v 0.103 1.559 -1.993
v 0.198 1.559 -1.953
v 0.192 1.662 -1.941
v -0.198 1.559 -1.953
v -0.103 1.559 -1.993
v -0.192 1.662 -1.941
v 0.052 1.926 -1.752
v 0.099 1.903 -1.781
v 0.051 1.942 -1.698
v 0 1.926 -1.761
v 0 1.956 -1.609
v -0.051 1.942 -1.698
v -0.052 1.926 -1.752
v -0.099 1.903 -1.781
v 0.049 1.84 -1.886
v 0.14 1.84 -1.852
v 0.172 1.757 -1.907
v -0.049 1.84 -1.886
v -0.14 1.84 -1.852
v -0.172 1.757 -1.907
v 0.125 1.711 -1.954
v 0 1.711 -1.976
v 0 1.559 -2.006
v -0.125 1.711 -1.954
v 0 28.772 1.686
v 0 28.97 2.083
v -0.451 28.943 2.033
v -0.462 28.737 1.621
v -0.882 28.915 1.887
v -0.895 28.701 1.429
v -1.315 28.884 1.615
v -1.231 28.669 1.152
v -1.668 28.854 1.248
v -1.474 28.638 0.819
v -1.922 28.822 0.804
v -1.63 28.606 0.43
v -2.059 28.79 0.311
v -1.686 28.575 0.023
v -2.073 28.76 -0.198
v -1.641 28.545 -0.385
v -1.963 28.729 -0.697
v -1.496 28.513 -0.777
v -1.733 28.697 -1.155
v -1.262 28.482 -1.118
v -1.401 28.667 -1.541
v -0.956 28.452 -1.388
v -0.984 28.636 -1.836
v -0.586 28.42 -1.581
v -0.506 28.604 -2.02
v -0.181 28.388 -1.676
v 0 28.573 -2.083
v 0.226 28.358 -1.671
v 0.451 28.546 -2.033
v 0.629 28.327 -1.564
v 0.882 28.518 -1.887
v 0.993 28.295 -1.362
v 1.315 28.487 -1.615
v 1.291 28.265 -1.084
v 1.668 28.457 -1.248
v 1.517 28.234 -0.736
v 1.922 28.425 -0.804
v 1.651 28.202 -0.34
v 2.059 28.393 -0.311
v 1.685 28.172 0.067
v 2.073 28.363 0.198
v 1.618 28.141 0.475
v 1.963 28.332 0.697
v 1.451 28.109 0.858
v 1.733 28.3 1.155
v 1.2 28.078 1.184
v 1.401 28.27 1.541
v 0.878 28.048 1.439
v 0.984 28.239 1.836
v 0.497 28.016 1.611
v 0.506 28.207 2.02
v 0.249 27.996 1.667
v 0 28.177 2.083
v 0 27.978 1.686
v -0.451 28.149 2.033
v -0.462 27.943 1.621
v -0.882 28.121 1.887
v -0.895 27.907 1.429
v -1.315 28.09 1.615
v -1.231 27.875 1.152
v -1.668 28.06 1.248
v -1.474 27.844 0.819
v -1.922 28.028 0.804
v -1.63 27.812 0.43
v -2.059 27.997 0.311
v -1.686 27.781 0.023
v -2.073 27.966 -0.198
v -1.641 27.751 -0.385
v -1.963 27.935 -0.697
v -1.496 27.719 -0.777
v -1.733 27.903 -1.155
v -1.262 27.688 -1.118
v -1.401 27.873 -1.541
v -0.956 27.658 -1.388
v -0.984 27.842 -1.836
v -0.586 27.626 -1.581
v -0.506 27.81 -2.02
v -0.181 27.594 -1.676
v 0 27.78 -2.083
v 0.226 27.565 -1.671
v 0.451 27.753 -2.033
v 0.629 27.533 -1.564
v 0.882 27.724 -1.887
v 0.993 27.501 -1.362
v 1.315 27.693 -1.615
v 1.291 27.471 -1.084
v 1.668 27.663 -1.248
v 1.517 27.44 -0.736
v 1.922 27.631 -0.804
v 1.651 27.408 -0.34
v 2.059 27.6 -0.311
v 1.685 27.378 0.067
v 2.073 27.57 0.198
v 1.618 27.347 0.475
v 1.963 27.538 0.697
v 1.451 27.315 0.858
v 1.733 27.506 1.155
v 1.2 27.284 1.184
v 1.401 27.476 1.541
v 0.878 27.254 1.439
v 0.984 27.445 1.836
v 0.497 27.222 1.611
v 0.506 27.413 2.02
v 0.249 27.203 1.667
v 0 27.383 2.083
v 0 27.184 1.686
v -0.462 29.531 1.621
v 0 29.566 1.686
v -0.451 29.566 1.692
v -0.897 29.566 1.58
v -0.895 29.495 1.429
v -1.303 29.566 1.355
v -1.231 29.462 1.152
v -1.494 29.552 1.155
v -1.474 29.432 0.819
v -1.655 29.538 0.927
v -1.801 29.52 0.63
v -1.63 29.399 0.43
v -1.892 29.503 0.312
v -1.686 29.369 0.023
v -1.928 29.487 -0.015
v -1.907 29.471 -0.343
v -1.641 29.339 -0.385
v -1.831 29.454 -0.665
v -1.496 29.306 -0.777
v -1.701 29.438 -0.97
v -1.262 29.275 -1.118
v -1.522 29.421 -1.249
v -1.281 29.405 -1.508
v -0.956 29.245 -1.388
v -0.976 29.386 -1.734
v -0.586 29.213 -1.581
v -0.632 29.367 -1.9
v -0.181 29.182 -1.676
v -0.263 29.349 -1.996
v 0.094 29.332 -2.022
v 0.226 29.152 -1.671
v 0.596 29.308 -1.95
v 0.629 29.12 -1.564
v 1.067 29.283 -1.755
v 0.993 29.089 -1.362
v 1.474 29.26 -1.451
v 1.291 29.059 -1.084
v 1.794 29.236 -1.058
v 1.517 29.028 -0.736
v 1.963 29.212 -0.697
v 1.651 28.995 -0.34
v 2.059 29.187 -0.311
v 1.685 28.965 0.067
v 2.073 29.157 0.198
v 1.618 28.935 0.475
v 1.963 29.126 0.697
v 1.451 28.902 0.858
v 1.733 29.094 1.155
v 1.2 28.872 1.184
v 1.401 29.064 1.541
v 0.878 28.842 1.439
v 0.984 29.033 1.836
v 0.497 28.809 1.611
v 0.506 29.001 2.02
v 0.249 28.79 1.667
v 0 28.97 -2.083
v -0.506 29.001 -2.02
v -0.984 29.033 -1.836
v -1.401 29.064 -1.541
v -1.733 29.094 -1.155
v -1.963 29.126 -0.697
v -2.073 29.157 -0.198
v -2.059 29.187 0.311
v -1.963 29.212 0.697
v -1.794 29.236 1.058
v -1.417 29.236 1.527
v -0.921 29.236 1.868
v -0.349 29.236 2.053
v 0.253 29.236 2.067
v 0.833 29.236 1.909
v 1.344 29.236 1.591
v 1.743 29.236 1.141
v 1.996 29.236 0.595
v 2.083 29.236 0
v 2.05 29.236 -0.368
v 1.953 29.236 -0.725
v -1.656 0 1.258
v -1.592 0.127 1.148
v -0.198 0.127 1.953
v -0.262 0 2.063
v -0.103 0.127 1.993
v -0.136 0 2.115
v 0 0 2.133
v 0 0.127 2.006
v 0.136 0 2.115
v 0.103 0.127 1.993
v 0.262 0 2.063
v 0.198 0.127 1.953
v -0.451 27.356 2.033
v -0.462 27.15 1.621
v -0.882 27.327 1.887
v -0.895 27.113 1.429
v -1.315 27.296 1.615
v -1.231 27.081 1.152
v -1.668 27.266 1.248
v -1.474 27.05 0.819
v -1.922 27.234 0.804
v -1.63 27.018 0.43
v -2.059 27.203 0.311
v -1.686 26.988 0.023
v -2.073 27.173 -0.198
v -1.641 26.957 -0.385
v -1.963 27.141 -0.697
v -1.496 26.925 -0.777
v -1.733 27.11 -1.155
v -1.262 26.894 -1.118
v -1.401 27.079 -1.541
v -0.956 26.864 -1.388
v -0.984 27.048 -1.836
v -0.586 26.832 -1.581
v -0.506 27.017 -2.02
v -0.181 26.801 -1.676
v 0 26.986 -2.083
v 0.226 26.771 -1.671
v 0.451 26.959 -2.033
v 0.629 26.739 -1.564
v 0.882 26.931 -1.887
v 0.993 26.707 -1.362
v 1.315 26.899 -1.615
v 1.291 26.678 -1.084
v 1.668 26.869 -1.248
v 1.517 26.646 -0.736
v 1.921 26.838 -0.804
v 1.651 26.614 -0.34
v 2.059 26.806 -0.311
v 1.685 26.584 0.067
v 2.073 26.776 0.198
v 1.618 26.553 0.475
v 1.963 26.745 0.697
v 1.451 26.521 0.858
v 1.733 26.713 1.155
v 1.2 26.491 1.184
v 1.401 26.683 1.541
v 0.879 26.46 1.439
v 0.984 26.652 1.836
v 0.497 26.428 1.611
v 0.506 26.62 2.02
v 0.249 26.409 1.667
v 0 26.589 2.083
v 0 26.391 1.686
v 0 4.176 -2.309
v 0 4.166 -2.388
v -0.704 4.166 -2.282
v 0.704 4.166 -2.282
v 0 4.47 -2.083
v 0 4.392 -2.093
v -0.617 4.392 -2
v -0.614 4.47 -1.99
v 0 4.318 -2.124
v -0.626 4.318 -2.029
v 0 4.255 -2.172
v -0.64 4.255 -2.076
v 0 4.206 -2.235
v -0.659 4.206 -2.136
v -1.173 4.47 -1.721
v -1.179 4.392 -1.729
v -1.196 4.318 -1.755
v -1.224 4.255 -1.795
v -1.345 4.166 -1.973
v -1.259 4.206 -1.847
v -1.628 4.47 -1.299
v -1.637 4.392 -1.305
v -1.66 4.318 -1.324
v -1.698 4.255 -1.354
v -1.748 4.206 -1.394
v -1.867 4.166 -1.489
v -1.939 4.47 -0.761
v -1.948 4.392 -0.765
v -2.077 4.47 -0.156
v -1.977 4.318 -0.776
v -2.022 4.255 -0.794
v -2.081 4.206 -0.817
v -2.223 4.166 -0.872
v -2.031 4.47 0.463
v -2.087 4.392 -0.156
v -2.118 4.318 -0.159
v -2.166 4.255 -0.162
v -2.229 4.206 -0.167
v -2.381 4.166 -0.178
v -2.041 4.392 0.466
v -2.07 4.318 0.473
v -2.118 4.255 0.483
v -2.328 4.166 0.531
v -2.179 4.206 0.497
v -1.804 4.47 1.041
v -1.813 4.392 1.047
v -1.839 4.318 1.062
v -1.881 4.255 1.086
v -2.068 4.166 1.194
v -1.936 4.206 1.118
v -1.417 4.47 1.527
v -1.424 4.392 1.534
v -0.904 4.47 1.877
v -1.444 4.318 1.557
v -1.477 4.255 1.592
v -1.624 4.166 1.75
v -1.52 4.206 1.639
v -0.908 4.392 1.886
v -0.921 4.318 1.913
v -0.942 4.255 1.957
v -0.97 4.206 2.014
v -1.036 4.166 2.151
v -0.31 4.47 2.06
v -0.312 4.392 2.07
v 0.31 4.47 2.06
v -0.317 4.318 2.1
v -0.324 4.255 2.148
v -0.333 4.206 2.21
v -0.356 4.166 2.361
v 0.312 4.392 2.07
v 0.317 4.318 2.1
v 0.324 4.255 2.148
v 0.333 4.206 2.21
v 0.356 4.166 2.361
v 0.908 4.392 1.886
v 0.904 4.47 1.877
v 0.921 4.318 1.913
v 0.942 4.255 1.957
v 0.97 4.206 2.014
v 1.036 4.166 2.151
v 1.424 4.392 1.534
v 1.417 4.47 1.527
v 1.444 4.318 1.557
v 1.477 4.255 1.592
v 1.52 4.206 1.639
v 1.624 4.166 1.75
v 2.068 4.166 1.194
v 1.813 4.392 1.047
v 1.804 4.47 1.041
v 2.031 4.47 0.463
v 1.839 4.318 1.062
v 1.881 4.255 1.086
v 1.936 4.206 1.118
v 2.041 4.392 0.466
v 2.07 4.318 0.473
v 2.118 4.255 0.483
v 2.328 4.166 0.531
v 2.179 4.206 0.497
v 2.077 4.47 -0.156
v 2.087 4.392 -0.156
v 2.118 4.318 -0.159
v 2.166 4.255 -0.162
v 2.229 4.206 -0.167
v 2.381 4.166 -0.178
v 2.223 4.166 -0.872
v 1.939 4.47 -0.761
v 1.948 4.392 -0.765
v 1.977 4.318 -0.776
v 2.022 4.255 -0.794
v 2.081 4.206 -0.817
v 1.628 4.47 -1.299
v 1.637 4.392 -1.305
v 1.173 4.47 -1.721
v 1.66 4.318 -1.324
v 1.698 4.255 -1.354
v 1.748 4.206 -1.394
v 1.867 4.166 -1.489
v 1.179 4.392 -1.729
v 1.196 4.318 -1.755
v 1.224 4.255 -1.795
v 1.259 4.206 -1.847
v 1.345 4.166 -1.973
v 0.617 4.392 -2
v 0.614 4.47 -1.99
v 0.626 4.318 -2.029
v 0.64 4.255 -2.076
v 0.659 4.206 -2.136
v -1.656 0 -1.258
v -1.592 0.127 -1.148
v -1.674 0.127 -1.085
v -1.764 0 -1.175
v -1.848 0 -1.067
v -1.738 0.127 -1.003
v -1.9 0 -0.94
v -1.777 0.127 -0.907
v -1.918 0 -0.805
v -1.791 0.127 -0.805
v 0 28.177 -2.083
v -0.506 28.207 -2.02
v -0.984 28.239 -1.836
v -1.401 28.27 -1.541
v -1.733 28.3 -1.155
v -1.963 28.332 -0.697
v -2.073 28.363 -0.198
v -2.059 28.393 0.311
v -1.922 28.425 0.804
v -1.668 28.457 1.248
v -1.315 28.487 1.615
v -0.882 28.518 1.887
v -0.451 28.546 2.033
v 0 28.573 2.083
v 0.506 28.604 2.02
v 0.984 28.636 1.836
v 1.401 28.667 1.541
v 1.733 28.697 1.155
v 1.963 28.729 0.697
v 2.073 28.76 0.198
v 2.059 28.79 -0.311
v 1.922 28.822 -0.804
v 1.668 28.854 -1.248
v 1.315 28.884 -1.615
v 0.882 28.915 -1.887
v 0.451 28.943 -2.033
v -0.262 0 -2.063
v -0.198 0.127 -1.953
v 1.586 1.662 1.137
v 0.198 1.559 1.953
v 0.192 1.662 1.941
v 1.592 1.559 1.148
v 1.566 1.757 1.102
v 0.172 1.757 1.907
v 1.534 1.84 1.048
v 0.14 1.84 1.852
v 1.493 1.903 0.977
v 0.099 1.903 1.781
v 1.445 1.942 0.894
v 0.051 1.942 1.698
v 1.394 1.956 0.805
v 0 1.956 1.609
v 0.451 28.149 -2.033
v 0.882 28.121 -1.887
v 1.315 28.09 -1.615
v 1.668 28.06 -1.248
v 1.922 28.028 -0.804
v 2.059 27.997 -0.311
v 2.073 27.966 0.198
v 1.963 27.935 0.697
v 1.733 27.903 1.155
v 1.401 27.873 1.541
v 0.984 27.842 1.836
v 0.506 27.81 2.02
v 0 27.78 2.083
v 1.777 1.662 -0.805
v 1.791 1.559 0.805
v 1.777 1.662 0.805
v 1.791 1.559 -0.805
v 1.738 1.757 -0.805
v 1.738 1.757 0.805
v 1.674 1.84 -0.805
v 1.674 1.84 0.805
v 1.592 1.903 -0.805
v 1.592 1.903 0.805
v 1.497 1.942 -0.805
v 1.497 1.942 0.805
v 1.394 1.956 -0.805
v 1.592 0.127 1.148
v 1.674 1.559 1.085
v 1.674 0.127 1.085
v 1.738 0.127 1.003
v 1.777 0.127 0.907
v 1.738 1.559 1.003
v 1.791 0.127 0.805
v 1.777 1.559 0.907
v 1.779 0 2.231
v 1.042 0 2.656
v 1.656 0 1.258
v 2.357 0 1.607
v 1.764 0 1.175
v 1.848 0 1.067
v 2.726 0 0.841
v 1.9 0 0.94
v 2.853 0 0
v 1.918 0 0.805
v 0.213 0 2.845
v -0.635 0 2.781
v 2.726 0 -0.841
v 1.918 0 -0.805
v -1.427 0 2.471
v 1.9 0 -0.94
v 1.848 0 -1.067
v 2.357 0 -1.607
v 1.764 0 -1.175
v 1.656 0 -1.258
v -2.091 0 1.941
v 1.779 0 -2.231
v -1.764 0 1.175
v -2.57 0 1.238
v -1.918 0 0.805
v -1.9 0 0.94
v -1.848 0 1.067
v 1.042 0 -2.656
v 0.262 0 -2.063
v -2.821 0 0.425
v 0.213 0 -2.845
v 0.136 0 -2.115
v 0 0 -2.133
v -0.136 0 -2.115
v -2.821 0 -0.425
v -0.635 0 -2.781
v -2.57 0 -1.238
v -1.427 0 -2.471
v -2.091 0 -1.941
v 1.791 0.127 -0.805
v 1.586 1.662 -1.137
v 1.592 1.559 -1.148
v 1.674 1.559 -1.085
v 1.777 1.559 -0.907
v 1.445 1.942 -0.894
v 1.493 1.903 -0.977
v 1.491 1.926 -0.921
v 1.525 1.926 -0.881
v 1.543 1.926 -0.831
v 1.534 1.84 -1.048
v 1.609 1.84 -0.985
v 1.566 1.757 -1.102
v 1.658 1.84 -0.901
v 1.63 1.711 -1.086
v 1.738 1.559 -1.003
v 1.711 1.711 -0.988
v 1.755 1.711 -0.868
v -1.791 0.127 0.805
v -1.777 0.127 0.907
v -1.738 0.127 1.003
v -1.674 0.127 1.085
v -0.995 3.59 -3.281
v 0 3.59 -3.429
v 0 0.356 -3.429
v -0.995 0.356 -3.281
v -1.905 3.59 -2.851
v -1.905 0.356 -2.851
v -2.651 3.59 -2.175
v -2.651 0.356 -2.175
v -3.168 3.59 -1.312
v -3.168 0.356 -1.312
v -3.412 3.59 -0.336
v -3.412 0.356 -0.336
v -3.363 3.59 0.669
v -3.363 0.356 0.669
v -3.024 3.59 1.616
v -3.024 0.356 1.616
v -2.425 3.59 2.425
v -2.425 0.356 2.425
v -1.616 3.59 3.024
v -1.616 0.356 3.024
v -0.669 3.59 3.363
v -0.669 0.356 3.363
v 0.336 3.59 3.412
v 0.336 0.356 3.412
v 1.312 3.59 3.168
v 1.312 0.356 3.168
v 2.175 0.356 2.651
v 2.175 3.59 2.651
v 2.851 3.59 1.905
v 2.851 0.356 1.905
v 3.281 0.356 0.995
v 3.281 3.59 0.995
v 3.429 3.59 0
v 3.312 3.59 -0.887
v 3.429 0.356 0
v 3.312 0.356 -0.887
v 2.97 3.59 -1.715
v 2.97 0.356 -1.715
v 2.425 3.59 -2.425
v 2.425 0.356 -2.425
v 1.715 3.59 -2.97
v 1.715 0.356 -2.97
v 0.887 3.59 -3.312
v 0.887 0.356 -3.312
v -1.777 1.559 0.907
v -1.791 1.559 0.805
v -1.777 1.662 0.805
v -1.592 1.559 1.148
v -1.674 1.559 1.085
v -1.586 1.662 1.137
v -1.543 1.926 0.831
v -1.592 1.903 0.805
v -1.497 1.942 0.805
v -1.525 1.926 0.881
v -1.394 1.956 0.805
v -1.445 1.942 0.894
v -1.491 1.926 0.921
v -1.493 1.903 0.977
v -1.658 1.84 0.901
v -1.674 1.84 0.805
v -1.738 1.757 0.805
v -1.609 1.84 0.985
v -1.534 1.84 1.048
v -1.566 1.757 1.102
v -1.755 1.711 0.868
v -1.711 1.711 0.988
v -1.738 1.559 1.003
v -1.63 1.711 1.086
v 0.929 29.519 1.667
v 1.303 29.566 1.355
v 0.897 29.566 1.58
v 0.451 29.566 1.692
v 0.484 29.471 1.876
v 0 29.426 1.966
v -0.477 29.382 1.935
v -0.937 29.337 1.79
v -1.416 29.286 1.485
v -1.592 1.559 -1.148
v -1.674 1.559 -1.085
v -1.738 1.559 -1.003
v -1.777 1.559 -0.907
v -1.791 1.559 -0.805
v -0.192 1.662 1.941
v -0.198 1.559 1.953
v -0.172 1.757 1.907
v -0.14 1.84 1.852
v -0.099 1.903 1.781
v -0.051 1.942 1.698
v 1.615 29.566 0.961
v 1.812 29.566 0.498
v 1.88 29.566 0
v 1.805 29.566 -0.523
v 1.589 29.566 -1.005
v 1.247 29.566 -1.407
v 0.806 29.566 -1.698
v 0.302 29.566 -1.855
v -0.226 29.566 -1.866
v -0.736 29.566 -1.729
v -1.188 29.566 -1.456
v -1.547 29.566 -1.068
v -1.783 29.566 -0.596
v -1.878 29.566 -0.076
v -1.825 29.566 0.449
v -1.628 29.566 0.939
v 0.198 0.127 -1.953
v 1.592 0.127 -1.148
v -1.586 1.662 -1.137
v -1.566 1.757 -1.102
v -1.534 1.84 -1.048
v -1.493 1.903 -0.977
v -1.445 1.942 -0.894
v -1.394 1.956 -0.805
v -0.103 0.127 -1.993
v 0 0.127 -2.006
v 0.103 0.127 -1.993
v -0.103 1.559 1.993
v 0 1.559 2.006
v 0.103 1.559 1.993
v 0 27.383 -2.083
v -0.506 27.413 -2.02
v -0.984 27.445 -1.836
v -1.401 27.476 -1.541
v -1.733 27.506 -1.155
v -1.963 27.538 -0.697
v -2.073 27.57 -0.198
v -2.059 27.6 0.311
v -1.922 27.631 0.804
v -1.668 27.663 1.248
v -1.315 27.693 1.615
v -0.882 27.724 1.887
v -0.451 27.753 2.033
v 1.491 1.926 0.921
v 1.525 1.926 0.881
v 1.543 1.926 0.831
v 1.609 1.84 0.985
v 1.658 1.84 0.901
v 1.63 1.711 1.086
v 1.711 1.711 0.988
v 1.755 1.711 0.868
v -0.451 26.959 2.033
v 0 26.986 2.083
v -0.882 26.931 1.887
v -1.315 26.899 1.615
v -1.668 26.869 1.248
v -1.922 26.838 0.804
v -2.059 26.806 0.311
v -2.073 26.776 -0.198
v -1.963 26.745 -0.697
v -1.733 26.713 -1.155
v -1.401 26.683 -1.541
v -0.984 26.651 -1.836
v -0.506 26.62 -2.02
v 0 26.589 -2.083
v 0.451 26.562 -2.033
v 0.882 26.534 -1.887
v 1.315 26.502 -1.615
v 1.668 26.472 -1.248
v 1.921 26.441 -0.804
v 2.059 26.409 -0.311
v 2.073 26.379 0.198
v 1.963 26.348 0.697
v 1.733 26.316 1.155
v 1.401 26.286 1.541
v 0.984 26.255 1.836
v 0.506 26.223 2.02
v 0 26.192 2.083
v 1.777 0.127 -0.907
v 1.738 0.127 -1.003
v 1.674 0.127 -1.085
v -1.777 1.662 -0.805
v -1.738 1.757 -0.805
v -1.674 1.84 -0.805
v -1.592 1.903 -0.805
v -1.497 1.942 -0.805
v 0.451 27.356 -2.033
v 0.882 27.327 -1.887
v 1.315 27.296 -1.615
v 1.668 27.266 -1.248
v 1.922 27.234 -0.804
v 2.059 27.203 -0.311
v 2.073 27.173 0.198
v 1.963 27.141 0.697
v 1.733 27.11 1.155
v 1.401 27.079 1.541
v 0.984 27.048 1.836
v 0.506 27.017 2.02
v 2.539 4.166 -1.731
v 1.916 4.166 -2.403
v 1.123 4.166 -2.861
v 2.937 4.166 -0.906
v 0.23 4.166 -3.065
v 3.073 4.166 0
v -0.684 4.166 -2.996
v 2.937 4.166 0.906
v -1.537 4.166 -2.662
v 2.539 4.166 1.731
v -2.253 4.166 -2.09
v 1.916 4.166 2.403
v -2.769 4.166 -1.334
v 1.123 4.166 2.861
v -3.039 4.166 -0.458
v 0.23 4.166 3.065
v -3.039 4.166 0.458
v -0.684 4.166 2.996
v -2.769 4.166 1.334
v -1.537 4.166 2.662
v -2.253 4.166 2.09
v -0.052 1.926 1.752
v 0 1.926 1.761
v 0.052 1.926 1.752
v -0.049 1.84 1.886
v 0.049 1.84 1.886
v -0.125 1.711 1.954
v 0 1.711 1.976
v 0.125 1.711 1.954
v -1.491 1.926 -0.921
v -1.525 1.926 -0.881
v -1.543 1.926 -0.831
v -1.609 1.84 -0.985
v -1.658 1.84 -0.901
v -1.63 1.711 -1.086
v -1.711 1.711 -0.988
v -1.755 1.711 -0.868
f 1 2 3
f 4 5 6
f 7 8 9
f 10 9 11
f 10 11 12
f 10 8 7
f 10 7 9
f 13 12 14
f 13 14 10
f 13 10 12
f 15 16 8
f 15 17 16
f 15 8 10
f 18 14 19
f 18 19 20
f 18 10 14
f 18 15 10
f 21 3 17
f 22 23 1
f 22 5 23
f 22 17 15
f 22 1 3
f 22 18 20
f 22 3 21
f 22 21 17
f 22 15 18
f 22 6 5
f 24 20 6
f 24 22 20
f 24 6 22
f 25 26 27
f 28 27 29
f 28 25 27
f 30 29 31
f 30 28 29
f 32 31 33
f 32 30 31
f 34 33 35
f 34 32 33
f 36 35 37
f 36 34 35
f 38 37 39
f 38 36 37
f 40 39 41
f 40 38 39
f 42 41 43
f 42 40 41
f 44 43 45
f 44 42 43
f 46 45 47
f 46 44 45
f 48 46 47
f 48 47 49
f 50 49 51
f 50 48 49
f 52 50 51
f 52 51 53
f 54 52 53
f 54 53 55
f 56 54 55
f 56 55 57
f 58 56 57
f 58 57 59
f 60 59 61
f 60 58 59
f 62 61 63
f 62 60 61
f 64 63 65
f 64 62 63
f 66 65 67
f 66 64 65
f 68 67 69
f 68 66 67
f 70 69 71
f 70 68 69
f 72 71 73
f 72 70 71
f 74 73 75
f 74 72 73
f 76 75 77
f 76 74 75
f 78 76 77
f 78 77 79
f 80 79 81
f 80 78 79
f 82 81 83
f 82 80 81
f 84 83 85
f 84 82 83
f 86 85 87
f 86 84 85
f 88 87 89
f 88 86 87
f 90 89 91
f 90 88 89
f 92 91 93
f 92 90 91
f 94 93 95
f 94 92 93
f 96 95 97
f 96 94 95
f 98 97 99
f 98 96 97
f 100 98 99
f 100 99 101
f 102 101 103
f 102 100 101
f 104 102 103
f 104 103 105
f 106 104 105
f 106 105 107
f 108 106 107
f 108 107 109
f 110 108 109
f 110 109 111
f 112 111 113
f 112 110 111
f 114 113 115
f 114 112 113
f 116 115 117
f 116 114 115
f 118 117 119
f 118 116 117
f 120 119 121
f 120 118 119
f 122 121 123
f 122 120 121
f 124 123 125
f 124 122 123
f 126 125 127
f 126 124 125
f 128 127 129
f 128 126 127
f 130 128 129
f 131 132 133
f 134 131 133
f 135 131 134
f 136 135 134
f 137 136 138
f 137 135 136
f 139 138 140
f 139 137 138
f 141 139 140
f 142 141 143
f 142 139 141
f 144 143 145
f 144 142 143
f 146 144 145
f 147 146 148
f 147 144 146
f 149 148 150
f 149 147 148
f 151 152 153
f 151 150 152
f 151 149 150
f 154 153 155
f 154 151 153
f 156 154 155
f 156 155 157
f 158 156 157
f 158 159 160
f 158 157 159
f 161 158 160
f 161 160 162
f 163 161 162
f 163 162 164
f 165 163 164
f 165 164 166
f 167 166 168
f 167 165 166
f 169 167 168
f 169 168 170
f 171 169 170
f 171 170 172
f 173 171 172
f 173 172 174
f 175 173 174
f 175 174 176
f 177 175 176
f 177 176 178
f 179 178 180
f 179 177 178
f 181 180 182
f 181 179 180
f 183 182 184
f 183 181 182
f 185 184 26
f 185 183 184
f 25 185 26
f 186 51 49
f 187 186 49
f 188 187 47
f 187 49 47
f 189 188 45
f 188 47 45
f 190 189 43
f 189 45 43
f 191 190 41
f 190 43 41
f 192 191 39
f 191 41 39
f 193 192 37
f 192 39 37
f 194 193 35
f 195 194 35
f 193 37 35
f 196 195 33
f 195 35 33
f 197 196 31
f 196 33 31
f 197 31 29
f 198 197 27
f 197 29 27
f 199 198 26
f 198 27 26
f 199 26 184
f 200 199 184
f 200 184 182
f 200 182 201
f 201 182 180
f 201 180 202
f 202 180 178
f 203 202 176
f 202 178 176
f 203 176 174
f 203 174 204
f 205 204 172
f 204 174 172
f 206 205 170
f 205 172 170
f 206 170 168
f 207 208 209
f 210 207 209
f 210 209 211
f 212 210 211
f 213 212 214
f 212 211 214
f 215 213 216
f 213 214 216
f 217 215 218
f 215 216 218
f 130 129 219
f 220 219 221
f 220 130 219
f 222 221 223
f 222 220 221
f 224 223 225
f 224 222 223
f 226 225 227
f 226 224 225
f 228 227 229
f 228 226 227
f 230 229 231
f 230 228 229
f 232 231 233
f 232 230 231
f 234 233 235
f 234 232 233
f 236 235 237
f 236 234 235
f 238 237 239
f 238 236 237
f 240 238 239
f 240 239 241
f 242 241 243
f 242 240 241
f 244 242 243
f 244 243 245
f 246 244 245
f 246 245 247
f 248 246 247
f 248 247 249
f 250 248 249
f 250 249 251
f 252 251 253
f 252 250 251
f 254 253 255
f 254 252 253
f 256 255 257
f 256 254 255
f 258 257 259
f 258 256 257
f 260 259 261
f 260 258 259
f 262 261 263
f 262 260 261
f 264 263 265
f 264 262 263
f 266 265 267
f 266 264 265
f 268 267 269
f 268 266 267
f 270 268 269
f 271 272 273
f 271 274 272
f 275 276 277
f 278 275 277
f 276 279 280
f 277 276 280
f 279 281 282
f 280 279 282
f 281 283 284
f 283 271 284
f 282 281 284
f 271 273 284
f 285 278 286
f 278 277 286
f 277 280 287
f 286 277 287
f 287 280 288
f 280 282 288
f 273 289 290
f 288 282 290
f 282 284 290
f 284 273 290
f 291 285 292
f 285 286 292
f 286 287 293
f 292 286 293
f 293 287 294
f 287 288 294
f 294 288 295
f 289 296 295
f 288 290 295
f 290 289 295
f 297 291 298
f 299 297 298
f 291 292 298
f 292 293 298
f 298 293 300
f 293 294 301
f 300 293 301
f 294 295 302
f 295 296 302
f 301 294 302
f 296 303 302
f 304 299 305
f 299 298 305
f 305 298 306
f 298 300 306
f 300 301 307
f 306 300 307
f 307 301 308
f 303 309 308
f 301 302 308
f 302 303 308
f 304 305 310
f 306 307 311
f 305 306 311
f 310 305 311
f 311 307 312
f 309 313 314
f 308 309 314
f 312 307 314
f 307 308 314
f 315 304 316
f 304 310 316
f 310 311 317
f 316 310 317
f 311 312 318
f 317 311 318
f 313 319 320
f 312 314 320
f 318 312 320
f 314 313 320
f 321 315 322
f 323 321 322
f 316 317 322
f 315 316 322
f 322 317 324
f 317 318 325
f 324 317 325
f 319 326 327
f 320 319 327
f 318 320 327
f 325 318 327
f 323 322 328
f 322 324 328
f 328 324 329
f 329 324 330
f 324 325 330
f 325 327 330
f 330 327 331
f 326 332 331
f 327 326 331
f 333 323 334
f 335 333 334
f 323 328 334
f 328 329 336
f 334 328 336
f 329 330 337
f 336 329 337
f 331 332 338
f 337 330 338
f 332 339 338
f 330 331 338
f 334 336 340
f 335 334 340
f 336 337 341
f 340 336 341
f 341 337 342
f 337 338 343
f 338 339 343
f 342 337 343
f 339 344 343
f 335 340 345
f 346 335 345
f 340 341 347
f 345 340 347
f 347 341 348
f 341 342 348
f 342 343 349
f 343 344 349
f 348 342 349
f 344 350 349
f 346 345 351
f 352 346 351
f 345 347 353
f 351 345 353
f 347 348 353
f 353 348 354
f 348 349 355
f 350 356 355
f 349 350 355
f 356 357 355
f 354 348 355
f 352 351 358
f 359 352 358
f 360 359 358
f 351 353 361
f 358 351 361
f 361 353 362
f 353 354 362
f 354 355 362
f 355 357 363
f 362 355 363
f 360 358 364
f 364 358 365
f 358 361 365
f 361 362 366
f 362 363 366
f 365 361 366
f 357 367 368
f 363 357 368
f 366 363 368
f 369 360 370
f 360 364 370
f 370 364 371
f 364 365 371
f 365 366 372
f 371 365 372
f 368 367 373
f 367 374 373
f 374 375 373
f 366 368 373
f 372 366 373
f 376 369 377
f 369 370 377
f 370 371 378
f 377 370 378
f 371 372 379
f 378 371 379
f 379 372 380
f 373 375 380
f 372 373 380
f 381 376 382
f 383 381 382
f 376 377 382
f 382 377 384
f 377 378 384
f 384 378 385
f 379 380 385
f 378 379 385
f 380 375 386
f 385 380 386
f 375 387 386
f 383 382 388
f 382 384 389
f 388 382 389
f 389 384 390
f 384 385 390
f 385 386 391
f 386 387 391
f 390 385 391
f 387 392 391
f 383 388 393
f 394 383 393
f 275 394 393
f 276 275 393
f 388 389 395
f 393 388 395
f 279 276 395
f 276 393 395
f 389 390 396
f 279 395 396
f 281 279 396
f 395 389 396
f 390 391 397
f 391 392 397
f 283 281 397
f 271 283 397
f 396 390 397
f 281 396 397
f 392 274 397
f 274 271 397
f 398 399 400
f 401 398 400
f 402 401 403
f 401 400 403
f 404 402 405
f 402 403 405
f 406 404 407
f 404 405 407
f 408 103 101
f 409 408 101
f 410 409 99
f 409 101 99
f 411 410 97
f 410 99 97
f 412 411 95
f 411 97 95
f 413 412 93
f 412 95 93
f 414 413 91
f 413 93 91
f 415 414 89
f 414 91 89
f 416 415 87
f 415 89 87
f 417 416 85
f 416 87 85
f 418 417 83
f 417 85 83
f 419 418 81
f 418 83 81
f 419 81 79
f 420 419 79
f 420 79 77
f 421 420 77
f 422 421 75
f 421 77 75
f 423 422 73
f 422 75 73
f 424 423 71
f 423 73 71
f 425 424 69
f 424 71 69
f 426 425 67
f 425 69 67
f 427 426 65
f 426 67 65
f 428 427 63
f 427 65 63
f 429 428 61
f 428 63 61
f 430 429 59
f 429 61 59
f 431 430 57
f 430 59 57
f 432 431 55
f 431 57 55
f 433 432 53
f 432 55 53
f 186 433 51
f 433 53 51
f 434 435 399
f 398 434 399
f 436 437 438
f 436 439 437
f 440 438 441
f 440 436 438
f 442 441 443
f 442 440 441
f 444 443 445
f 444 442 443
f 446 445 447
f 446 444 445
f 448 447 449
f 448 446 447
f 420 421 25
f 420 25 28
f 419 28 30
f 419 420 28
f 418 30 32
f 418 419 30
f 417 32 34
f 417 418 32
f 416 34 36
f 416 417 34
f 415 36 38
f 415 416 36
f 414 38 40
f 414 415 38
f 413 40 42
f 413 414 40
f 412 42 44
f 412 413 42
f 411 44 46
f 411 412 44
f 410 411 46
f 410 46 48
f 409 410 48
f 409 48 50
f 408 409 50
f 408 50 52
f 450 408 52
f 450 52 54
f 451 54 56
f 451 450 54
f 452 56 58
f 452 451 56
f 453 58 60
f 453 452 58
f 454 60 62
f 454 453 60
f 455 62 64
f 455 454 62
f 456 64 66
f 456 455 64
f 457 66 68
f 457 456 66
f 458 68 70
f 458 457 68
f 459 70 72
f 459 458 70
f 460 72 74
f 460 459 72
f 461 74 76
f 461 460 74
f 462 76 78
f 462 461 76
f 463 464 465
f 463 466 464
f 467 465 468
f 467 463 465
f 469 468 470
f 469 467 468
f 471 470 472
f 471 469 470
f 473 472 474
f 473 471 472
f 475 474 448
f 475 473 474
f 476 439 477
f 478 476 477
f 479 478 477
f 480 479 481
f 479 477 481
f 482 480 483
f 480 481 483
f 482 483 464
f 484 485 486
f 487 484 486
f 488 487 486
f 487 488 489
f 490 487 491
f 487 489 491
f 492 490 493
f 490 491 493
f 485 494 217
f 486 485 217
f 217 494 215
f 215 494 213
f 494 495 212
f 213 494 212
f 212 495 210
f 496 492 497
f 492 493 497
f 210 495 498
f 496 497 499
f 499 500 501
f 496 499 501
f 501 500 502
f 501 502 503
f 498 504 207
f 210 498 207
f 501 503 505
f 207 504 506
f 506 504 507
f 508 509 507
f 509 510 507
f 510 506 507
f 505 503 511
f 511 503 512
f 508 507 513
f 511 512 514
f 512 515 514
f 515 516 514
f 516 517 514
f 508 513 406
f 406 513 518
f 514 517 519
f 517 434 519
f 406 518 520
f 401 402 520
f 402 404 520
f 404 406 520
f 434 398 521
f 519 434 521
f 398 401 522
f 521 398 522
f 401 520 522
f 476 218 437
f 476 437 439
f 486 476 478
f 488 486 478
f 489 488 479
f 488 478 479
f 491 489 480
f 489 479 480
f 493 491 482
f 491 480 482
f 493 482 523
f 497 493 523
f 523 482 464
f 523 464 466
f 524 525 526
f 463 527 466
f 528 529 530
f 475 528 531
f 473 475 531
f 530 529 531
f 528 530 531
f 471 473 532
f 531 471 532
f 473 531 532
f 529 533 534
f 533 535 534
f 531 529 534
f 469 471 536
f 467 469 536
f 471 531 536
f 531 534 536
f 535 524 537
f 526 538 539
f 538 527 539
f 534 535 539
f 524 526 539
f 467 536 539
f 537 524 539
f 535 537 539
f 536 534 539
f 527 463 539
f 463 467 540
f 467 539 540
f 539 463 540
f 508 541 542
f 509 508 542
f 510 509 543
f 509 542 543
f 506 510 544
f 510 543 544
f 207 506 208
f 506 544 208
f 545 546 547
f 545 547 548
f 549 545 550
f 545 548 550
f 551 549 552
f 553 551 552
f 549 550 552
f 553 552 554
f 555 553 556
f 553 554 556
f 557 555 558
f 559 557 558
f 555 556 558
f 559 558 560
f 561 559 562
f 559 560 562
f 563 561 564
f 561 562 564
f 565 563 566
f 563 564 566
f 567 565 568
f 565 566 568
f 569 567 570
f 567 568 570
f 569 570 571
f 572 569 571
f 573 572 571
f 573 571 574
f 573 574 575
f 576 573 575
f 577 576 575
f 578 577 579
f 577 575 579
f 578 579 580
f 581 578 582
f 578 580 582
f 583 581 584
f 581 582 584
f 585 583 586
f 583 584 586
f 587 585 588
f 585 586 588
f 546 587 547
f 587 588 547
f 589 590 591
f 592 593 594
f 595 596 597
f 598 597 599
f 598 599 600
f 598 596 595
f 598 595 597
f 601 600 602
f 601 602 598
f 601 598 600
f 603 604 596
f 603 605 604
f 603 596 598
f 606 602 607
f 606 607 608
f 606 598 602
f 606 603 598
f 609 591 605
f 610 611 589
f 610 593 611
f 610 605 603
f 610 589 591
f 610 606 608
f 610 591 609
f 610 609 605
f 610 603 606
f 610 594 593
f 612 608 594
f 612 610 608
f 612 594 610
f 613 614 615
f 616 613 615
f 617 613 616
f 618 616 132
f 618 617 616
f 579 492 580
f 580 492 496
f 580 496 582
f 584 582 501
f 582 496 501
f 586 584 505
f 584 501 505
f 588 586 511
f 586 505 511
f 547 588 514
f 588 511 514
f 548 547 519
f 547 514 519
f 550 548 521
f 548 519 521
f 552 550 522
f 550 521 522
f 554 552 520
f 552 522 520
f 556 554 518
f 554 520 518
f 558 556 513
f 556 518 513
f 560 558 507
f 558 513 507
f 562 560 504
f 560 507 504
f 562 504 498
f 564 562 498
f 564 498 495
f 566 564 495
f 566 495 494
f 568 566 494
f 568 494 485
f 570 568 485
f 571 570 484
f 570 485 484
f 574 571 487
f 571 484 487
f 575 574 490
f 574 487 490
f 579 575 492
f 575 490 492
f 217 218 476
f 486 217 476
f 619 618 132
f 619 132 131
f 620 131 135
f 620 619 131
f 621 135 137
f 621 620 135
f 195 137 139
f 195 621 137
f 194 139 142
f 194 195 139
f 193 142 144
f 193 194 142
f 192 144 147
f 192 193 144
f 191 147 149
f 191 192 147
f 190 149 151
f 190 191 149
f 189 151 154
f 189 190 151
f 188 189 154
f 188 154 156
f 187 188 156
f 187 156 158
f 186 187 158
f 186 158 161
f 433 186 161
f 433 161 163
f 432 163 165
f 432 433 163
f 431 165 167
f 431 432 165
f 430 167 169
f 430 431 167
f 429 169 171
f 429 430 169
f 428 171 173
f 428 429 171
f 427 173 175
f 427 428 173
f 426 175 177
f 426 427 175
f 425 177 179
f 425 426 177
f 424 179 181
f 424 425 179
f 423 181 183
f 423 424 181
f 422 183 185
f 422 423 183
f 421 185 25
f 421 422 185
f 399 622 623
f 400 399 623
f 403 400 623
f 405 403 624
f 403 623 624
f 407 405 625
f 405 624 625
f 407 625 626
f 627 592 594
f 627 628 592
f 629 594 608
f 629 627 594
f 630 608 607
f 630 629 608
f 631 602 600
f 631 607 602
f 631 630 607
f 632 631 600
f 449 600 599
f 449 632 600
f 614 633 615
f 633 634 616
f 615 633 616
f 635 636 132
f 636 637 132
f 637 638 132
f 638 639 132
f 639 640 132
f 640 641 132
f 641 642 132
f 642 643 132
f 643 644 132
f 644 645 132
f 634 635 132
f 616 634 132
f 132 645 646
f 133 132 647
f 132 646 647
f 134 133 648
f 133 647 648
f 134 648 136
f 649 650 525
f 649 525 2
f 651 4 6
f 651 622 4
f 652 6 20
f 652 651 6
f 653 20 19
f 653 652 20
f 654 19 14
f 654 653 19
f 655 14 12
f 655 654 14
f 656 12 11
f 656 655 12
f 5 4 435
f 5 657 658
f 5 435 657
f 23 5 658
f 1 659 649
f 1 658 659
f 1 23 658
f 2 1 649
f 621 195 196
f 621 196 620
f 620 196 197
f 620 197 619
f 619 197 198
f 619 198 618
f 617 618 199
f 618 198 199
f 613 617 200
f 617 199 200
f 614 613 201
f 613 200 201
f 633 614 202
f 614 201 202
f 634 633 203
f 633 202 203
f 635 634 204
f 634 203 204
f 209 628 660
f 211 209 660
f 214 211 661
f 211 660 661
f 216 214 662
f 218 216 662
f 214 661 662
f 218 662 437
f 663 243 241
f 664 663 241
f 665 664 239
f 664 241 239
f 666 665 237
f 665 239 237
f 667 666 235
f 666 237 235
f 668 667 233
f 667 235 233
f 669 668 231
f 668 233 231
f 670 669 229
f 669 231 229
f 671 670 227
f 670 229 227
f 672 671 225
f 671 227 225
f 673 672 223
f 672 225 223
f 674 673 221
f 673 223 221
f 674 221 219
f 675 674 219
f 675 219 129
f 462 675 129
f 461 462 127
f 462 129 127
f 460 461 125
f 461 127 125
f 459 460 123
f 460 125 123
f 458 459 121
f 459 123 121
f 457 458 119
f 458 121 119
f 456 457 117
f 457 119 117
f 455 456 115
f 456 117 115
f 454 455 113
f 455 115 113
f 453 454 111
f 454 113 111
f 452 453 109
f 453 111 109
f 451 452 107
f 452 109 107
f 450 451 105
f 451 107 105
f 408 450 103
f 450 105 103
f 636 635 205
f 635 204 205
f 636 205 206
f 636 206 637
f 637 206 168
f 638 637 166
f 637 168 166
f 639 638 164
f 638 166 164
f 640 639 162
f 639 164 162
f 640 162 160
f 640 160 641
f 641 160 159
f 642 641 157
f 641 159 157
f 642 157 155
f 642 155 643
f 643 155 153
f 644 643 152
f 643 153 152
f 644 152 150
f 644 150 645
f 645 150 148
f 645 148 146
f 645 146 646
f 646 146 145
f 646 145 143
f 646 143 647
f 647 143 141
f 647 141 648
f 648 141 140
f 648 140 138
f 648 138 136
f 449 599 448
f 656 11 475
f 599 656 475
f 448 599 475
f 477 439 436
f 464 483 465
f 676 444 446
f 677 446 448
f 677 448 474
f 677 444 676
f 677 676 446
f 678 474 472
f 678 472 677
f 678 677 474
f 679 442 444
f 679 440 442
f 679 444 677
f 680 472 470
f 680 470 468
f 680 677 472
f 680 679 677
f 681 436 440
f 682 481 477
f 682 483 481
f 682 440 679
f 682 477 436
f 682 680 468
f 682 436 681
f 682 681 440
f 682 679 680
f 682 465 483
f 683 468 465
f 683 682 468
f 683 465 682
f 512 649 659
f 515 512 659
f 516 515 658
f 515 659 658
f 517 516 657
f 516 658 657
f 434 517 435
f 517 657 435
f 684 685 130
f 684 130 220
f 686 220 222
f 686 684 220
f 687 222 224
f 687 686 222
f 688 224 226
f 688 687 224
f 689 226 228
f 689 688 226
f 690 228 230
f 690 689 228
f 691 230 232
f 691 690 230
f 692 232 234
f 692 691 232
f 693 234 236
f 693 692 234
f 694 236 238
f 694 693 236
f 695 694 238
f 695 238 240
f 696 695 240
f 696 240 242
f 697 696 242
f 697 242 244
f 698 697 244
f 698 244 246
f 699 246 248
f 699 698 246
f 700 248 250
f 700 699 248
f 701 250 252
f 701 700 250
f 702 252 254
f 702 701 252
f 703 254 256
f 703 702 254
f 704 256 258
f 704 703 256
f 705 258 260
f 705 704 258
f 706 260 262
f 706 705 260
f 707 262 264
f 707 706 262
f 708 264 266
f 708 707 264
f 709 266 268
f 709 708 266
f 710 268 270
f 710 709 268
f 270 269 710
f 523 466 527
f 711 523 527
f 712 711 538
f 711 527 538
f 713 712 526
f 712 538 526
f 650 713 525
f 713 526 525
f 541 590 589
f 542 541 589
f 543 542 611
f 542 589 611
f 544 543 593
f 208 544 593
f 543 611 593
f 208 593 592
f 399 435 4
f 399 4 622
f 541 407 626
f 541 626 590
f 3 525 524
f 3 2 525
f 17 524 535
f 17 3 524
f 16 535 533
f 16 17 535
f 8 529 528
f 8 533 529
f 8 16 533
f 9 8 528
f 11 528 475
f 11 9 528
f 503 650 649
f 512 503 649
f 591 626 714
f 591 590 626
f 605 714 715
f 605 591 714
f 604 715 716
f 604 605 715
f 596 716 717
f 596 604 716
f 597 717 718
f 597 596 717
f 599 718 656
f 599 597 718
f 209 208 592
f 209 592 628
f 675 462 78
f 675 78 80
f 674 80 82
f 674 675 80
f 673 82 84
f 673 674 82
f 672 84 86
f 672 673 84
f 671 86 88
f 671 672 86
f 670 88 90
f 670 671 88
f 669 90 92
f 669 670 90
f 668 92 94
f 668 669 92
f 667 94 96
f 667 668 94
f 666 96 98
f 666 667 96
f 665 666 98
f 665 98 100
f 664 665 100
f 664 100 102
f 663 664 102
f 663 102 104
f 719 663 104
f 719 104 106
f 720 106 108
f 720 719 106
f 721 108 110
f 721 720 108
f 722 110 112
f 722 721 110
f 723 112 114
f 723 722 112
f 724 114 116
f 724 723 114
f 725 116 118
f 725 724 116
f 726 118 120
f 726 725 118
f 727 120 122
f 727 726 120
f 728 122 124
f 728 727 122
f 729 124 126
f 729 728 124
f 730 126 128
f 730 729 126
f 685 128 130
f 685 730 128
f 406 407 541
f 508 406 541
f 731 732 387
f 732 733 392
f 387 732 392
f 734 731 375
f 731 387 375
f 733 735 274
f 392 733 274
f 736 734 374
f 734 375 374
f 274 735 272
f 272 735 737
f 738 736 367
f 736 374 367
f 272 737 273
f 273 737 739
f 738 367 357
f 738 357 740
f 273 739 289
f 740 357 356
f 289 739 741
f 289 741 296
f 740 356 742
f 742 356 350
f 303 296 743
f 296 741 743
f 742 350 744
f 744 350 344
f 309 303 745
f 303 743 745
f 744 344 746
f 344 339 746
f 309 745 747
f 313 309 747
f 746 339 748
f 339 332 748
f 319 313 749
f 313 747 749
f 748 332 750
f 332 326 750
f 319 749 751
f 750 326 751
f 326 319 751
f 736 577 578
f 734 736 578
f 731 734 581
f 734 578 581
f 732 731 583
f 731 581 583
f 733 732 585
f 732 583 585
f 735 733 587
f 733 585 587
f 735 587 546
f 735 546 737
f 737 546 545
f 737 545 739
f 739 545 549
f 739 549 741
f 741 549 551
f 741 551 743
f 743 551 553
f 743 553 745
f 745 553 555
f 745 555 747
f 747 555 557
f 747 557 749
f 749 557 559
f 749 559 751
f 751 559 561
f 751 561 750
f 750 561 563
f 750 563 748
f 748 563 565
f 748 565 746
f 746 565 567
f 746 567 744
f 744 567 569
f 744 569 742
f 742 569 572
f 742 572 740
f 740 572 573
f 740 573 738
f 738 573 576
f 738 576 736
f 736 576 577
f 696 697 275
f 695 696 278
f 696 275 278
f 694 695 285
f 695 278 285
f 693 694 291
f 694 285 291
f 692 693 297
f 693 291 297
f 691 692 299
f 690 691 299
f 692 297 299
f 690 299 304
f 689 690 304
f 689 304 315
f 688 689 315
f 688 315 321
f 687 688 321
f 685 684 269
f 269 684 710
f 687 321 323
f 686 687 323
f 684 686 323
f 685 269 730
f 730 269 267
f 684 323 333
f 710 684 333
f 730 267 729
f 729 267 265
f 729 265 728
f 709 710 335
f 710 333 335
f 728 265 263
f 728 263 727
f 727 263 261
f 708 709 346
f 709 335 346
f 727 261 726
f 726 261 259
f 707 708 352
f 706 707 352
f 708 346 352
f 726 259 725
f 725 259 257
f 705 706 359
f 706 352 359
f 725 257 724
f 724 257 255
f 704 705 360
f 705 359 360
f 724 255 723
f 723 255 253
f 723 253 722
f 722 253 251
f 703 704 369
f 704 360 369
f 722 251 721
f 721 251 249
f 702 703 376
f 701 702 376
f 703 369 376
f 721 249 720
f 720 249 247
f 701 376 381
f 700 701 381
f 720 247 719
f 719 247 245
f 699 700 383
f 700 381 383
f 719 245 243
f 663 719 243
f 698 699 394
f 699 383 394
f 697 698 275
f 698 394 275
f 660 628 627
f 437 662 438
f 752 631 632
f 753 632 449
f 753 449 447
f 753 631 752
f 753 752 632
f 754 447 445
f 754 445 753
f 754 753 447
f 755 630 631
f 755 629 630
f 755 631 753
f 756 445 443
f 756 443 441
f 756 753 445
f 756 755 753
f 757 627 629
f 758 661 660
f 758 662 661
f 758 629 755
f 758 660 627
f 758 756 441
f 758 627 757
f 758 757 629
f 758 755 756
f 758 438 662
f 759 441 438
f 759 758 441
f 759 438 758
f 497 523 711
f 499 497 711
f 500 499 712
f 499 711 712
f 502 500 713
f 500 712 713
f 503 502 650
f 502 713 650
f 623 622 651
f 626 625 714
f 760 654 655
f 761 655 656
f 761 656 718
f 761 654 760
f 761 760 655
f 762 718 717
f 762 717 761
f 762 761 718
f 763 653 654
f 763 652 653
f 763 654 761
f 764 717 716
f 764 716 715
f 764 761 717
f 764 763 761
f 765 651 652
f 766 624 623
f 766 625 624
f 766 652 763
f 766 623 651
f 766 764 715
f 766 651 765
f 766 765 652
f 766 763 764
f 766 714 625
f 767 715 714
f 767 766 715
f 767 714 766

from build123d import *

# Parameters (mm, degrees)
CUT_SWEEP1_PITCH   = 0.793751588
CUT_EXTRUDE1_DEPTH = 1.955803912
FILLET1_R          = 0.30480061
FILLET2_R          = 0.396875794
CHAMFER3_SIZE      = 0.127


with BuildPart() as part:
    # Sketch1 → Revolve1 (revolve)
    with BuildSketch(Plane.XY, mode=Mode.PRIVATE) as revolve1_sk:
        Polygon((0, 0), (0, 29.565608331), (2.082804166, 29.565608331), (2.082804166, 4.165608331), (3.429006858, 4.165608331), (3.429006858, 0), align=None)
    revolve(revolve1_sk.sketch.rotate(Axis((0, 0, 0), (0, 1, 0)), 90), axis=Axis((0, 0, 0), (0, 1, 0)))

    # Cut-Sweep1: arcs per turn and ends read off the stored shape
    # Cut-Sweep1: the profile of Sketch3 profile screwed along a right-hand helix through 4.999992 turns, 8 arcs to a turn; built about Z, then put on its axis
    cut_sweep1_z = Axis((0, 0, 0), (0, 0, 1))
    cut_sweep1_corners = [(2.083104166, 0, -0.595163691), (2.083104166, 0, -0.992339484), (1.685928372, 0, -0.793751588)]
    with BuildLine(mode=Mode.PRIVATE) as cut_sweep1_profile:
        Line(cut_sweep1_corners[0], cut_sweep1_corners[1])
        Line(cut_sweep1_corners[1], cut_sweep1_corners[2])
        Line(cut_sweep1_corners[2], cut_sweep1_corners[0])
    cut_sweep1_cap = Face(cut_sweep1_profile.wire())
    cut_sweep1_turn_angles = [0, 22.5, 45, 67.5, 90, 112.5, 135, 157.5, 180, 202.5, 225, 247.5, 270, 292.5, 315, 337.5, 360]
    cut_sweep1_turn_weights = [1, 0.9238795325112867, 1, 0.9238795325112867, 1, 0.9238795325112867, 1, 0.9238795325112867, 1, 0.9238795325112867, 1, 0.9238795325112867, 1, 0.9238795325112867, 1, 0.9238795325112867, 1]
    cut_sweep1_turn_rails = [Edge.make_bspline([Vector(p[0], p[1], 0).rotate(cut_sweep1_z, cut_sweep1_turn_angles[k]) / cut_sweep1_turn_weights[k] + Vector(0, 0, p[2] + CUT_SWEEP1_PITCH * cut_sweep1_turn_angles[k] / 360) for k in range(17)], [0, 0, 0, 1, 1, 2, 2, 3, 3, 4, 4, 5, 5, 6, 6, 7, 7, 8, 8, 8], 2, cut_sweep1_turn_weights) for p in cut_sweep1_corners]
    cut_sweep1_turn_sides = [Face.make_surface_from_curves(cut_sweep1_turn_rails[p[0]], cut_sweep1_turn_rails[p[1]]) for p in [(0, 1), (1, 2), (2, 0)]]
    cut_sweep1_last_angles = [1440, 1462.5, 1485, 1507.5, 1530, 1552.5, 1575, 1597.5, 1620, 1642.5, 1665, 1687.5, 1710, 1732.5, 1755, 1777.4985, 1799.997]
    cut_sweep1_last_weights = [1, 0.9238795325112867, 1, 0.9238795325112867, 1, 0.9238795325112867, 1, 0.9238795325112867, 1, 0.9238795325112867, 1, 0.9238795325112867, 1, 0.9238795325112867, 1, 0.9238895508235082, 1]
    cut_sweep1_last_rails = [Edge.make_bspline([Vector(p[0], p[1], 0).rotate(cut_sweep1_z, cut_sweep1_last_angles[k]) / cut_sweep1_last_weights[k] + Vector(0, 0, p[2] + CUT_SWEEP1_PITCH * cut_sweep1_last_angles[k] / 360) for k in range(17)], [0, 0, 0, 1, 1, 2, 2, 3, 3, 4, 4, 5, 5, 6, 6, 7, 7, 8, 8, 8], 2, cut_sweep1_last_weights) for p in cut_sweep1_corners]
    cut_sweep1_last_sides = [Face.make_surface_from_curves(cut_sweep1_last_rails[p[0]], cut_sweep1_last_rails[p[1]]) for p in [(0, 1), (1, 2), (2, 0)]]
    cut_sweep1 = Plane(origin=(0, 29.565608331, 0), x_dir=(0, 0, 1), z_dir=(0, -1, 0)) * Solid(Shell([*[p.moved(Location((0, 0, CUT_SWEEP1_PITCH * i))) for i in range(4) for p in cut_sweep1_turn_sides], *cut_sweep1_last_sides, cut_sweep1_cap, cut_sweep1_cap.rotate(cut_sweep1_z, 1799.997).moved(Location((0, 0, CUT_SWEEP1_PITCH * 1799.997 / 360)))]))
    add(cut_sweep1, mode=Mode.SUBTRACT)

    # Sketch4 → Cut-Extrude1 (cut)
    with BuildSketch(Plane(origin=(0, 0, 0), x_dir=(1, 0, 0), z_dir=(0, 1, 0))):
        Polygon((0, 2.06772639), (-1.790703581, 1.033863195), (-1.790703581, -1.033863195), (0, -2.06772639), (1.790703581, -1.033863195), (1.790703581, 1.033863195), align=None)
    extrude(amount=CUT_EXTRUDE1_DEPTH, mode=Mode.SUBTRACT)

    # Fillet1
    fillet1_edges = [part.edges().sort_by_distance(p)[0] for p in [
        (0, 4.165608331, 2.082804166),
    ]]
    fillet(fillet1_edges, radius=FILLET1_R)

    # Fillet2
    fillet2_edges = [part.edges().sort_by_distance(p)[0] for p in [
        (1.790703581, 0.977901956, -1.033863195),
        (0, 0.977901956, -2.06772639),
        (-1.790703581, 0.977901956, -1.033863195),
        (-1.790703581, 0.977901956, 1.033863195),
        (0, 0.977901956, 2.06772639),
        (1.790703581, 0.977901956, 1.033863195),
        (0.895351791, 1.955803912, -1.550794792),
        (-0.895351791, 1.955803912, -1.550794792),
        (-1.790703581, 1.955803912, 0),
        (-0.895351791, 1.955803912, 1.550794792),
        (0.895351791, 1.955803912, 1.550794792),
        (1.790703581, 1.955803912, 0),
    ]]
    fillet(fillet2_edges, radius=FILLET2_R)

    # Chamfer1: read off the stored shape, not the designer's step
    # Chamfer1 outline → Chamfer1 (revolve, cut)
    with BuildSketch(Plane.XY):
        Polygon((2.082804166, 29.565608331), (1.879603759, 29.565608331), (2.082804166, 29.236469354), align=None)
    revolve(axis=Axis((0, 0, 0), (0, 1, 0)), mode=Mode.SUBTRACT)

    # Chamfer2: read off the stored shape, not the designer's step
    # Chamfer2 outline → Chamfer2 (revolve, cut)
    with BuildSketch(Plane.XY):
        Polygon((2.853013648, 0), (3.429006858, 0), (3.429006858, 0.355600711), align=None)
        Polygon((3.073406147, 4.165608331), (3.429006858, 3.589615121), (3.429006858, 4.165608331), align=None)
    revolve(axis=Axis((0, 0, 0), (0, 1, 0)), mode=Mode.SUBTRACT)

    # Chamfer3
    chamfer3_edges = [part.edges().sort_by_distance(p)[0] for p in [
        (0.895351791, 0, -1.550794792),
        (-0.895351791, 0, -1.550794792),
        (-1.790703581, 0, 0),
        (-0.895351791, 0, 1.550794792),
        (0.895351791, 0, 1.550794792),
        (1.790703581, 0, 0),
        (0, 0, -2.006329491),
        (1.737532307, 0, -1.003164745),
        (1.737532307, 0, 1.003164745),
        (0, 0, 2.006329491),
        (-1.737532307, 0, 1.003164745),
        (-1.737532307, 0, -1.003164745),
    ]]
    chamfer(chamfer3_edges, length=CHAMFER3_SIZE)


solid = part.part
